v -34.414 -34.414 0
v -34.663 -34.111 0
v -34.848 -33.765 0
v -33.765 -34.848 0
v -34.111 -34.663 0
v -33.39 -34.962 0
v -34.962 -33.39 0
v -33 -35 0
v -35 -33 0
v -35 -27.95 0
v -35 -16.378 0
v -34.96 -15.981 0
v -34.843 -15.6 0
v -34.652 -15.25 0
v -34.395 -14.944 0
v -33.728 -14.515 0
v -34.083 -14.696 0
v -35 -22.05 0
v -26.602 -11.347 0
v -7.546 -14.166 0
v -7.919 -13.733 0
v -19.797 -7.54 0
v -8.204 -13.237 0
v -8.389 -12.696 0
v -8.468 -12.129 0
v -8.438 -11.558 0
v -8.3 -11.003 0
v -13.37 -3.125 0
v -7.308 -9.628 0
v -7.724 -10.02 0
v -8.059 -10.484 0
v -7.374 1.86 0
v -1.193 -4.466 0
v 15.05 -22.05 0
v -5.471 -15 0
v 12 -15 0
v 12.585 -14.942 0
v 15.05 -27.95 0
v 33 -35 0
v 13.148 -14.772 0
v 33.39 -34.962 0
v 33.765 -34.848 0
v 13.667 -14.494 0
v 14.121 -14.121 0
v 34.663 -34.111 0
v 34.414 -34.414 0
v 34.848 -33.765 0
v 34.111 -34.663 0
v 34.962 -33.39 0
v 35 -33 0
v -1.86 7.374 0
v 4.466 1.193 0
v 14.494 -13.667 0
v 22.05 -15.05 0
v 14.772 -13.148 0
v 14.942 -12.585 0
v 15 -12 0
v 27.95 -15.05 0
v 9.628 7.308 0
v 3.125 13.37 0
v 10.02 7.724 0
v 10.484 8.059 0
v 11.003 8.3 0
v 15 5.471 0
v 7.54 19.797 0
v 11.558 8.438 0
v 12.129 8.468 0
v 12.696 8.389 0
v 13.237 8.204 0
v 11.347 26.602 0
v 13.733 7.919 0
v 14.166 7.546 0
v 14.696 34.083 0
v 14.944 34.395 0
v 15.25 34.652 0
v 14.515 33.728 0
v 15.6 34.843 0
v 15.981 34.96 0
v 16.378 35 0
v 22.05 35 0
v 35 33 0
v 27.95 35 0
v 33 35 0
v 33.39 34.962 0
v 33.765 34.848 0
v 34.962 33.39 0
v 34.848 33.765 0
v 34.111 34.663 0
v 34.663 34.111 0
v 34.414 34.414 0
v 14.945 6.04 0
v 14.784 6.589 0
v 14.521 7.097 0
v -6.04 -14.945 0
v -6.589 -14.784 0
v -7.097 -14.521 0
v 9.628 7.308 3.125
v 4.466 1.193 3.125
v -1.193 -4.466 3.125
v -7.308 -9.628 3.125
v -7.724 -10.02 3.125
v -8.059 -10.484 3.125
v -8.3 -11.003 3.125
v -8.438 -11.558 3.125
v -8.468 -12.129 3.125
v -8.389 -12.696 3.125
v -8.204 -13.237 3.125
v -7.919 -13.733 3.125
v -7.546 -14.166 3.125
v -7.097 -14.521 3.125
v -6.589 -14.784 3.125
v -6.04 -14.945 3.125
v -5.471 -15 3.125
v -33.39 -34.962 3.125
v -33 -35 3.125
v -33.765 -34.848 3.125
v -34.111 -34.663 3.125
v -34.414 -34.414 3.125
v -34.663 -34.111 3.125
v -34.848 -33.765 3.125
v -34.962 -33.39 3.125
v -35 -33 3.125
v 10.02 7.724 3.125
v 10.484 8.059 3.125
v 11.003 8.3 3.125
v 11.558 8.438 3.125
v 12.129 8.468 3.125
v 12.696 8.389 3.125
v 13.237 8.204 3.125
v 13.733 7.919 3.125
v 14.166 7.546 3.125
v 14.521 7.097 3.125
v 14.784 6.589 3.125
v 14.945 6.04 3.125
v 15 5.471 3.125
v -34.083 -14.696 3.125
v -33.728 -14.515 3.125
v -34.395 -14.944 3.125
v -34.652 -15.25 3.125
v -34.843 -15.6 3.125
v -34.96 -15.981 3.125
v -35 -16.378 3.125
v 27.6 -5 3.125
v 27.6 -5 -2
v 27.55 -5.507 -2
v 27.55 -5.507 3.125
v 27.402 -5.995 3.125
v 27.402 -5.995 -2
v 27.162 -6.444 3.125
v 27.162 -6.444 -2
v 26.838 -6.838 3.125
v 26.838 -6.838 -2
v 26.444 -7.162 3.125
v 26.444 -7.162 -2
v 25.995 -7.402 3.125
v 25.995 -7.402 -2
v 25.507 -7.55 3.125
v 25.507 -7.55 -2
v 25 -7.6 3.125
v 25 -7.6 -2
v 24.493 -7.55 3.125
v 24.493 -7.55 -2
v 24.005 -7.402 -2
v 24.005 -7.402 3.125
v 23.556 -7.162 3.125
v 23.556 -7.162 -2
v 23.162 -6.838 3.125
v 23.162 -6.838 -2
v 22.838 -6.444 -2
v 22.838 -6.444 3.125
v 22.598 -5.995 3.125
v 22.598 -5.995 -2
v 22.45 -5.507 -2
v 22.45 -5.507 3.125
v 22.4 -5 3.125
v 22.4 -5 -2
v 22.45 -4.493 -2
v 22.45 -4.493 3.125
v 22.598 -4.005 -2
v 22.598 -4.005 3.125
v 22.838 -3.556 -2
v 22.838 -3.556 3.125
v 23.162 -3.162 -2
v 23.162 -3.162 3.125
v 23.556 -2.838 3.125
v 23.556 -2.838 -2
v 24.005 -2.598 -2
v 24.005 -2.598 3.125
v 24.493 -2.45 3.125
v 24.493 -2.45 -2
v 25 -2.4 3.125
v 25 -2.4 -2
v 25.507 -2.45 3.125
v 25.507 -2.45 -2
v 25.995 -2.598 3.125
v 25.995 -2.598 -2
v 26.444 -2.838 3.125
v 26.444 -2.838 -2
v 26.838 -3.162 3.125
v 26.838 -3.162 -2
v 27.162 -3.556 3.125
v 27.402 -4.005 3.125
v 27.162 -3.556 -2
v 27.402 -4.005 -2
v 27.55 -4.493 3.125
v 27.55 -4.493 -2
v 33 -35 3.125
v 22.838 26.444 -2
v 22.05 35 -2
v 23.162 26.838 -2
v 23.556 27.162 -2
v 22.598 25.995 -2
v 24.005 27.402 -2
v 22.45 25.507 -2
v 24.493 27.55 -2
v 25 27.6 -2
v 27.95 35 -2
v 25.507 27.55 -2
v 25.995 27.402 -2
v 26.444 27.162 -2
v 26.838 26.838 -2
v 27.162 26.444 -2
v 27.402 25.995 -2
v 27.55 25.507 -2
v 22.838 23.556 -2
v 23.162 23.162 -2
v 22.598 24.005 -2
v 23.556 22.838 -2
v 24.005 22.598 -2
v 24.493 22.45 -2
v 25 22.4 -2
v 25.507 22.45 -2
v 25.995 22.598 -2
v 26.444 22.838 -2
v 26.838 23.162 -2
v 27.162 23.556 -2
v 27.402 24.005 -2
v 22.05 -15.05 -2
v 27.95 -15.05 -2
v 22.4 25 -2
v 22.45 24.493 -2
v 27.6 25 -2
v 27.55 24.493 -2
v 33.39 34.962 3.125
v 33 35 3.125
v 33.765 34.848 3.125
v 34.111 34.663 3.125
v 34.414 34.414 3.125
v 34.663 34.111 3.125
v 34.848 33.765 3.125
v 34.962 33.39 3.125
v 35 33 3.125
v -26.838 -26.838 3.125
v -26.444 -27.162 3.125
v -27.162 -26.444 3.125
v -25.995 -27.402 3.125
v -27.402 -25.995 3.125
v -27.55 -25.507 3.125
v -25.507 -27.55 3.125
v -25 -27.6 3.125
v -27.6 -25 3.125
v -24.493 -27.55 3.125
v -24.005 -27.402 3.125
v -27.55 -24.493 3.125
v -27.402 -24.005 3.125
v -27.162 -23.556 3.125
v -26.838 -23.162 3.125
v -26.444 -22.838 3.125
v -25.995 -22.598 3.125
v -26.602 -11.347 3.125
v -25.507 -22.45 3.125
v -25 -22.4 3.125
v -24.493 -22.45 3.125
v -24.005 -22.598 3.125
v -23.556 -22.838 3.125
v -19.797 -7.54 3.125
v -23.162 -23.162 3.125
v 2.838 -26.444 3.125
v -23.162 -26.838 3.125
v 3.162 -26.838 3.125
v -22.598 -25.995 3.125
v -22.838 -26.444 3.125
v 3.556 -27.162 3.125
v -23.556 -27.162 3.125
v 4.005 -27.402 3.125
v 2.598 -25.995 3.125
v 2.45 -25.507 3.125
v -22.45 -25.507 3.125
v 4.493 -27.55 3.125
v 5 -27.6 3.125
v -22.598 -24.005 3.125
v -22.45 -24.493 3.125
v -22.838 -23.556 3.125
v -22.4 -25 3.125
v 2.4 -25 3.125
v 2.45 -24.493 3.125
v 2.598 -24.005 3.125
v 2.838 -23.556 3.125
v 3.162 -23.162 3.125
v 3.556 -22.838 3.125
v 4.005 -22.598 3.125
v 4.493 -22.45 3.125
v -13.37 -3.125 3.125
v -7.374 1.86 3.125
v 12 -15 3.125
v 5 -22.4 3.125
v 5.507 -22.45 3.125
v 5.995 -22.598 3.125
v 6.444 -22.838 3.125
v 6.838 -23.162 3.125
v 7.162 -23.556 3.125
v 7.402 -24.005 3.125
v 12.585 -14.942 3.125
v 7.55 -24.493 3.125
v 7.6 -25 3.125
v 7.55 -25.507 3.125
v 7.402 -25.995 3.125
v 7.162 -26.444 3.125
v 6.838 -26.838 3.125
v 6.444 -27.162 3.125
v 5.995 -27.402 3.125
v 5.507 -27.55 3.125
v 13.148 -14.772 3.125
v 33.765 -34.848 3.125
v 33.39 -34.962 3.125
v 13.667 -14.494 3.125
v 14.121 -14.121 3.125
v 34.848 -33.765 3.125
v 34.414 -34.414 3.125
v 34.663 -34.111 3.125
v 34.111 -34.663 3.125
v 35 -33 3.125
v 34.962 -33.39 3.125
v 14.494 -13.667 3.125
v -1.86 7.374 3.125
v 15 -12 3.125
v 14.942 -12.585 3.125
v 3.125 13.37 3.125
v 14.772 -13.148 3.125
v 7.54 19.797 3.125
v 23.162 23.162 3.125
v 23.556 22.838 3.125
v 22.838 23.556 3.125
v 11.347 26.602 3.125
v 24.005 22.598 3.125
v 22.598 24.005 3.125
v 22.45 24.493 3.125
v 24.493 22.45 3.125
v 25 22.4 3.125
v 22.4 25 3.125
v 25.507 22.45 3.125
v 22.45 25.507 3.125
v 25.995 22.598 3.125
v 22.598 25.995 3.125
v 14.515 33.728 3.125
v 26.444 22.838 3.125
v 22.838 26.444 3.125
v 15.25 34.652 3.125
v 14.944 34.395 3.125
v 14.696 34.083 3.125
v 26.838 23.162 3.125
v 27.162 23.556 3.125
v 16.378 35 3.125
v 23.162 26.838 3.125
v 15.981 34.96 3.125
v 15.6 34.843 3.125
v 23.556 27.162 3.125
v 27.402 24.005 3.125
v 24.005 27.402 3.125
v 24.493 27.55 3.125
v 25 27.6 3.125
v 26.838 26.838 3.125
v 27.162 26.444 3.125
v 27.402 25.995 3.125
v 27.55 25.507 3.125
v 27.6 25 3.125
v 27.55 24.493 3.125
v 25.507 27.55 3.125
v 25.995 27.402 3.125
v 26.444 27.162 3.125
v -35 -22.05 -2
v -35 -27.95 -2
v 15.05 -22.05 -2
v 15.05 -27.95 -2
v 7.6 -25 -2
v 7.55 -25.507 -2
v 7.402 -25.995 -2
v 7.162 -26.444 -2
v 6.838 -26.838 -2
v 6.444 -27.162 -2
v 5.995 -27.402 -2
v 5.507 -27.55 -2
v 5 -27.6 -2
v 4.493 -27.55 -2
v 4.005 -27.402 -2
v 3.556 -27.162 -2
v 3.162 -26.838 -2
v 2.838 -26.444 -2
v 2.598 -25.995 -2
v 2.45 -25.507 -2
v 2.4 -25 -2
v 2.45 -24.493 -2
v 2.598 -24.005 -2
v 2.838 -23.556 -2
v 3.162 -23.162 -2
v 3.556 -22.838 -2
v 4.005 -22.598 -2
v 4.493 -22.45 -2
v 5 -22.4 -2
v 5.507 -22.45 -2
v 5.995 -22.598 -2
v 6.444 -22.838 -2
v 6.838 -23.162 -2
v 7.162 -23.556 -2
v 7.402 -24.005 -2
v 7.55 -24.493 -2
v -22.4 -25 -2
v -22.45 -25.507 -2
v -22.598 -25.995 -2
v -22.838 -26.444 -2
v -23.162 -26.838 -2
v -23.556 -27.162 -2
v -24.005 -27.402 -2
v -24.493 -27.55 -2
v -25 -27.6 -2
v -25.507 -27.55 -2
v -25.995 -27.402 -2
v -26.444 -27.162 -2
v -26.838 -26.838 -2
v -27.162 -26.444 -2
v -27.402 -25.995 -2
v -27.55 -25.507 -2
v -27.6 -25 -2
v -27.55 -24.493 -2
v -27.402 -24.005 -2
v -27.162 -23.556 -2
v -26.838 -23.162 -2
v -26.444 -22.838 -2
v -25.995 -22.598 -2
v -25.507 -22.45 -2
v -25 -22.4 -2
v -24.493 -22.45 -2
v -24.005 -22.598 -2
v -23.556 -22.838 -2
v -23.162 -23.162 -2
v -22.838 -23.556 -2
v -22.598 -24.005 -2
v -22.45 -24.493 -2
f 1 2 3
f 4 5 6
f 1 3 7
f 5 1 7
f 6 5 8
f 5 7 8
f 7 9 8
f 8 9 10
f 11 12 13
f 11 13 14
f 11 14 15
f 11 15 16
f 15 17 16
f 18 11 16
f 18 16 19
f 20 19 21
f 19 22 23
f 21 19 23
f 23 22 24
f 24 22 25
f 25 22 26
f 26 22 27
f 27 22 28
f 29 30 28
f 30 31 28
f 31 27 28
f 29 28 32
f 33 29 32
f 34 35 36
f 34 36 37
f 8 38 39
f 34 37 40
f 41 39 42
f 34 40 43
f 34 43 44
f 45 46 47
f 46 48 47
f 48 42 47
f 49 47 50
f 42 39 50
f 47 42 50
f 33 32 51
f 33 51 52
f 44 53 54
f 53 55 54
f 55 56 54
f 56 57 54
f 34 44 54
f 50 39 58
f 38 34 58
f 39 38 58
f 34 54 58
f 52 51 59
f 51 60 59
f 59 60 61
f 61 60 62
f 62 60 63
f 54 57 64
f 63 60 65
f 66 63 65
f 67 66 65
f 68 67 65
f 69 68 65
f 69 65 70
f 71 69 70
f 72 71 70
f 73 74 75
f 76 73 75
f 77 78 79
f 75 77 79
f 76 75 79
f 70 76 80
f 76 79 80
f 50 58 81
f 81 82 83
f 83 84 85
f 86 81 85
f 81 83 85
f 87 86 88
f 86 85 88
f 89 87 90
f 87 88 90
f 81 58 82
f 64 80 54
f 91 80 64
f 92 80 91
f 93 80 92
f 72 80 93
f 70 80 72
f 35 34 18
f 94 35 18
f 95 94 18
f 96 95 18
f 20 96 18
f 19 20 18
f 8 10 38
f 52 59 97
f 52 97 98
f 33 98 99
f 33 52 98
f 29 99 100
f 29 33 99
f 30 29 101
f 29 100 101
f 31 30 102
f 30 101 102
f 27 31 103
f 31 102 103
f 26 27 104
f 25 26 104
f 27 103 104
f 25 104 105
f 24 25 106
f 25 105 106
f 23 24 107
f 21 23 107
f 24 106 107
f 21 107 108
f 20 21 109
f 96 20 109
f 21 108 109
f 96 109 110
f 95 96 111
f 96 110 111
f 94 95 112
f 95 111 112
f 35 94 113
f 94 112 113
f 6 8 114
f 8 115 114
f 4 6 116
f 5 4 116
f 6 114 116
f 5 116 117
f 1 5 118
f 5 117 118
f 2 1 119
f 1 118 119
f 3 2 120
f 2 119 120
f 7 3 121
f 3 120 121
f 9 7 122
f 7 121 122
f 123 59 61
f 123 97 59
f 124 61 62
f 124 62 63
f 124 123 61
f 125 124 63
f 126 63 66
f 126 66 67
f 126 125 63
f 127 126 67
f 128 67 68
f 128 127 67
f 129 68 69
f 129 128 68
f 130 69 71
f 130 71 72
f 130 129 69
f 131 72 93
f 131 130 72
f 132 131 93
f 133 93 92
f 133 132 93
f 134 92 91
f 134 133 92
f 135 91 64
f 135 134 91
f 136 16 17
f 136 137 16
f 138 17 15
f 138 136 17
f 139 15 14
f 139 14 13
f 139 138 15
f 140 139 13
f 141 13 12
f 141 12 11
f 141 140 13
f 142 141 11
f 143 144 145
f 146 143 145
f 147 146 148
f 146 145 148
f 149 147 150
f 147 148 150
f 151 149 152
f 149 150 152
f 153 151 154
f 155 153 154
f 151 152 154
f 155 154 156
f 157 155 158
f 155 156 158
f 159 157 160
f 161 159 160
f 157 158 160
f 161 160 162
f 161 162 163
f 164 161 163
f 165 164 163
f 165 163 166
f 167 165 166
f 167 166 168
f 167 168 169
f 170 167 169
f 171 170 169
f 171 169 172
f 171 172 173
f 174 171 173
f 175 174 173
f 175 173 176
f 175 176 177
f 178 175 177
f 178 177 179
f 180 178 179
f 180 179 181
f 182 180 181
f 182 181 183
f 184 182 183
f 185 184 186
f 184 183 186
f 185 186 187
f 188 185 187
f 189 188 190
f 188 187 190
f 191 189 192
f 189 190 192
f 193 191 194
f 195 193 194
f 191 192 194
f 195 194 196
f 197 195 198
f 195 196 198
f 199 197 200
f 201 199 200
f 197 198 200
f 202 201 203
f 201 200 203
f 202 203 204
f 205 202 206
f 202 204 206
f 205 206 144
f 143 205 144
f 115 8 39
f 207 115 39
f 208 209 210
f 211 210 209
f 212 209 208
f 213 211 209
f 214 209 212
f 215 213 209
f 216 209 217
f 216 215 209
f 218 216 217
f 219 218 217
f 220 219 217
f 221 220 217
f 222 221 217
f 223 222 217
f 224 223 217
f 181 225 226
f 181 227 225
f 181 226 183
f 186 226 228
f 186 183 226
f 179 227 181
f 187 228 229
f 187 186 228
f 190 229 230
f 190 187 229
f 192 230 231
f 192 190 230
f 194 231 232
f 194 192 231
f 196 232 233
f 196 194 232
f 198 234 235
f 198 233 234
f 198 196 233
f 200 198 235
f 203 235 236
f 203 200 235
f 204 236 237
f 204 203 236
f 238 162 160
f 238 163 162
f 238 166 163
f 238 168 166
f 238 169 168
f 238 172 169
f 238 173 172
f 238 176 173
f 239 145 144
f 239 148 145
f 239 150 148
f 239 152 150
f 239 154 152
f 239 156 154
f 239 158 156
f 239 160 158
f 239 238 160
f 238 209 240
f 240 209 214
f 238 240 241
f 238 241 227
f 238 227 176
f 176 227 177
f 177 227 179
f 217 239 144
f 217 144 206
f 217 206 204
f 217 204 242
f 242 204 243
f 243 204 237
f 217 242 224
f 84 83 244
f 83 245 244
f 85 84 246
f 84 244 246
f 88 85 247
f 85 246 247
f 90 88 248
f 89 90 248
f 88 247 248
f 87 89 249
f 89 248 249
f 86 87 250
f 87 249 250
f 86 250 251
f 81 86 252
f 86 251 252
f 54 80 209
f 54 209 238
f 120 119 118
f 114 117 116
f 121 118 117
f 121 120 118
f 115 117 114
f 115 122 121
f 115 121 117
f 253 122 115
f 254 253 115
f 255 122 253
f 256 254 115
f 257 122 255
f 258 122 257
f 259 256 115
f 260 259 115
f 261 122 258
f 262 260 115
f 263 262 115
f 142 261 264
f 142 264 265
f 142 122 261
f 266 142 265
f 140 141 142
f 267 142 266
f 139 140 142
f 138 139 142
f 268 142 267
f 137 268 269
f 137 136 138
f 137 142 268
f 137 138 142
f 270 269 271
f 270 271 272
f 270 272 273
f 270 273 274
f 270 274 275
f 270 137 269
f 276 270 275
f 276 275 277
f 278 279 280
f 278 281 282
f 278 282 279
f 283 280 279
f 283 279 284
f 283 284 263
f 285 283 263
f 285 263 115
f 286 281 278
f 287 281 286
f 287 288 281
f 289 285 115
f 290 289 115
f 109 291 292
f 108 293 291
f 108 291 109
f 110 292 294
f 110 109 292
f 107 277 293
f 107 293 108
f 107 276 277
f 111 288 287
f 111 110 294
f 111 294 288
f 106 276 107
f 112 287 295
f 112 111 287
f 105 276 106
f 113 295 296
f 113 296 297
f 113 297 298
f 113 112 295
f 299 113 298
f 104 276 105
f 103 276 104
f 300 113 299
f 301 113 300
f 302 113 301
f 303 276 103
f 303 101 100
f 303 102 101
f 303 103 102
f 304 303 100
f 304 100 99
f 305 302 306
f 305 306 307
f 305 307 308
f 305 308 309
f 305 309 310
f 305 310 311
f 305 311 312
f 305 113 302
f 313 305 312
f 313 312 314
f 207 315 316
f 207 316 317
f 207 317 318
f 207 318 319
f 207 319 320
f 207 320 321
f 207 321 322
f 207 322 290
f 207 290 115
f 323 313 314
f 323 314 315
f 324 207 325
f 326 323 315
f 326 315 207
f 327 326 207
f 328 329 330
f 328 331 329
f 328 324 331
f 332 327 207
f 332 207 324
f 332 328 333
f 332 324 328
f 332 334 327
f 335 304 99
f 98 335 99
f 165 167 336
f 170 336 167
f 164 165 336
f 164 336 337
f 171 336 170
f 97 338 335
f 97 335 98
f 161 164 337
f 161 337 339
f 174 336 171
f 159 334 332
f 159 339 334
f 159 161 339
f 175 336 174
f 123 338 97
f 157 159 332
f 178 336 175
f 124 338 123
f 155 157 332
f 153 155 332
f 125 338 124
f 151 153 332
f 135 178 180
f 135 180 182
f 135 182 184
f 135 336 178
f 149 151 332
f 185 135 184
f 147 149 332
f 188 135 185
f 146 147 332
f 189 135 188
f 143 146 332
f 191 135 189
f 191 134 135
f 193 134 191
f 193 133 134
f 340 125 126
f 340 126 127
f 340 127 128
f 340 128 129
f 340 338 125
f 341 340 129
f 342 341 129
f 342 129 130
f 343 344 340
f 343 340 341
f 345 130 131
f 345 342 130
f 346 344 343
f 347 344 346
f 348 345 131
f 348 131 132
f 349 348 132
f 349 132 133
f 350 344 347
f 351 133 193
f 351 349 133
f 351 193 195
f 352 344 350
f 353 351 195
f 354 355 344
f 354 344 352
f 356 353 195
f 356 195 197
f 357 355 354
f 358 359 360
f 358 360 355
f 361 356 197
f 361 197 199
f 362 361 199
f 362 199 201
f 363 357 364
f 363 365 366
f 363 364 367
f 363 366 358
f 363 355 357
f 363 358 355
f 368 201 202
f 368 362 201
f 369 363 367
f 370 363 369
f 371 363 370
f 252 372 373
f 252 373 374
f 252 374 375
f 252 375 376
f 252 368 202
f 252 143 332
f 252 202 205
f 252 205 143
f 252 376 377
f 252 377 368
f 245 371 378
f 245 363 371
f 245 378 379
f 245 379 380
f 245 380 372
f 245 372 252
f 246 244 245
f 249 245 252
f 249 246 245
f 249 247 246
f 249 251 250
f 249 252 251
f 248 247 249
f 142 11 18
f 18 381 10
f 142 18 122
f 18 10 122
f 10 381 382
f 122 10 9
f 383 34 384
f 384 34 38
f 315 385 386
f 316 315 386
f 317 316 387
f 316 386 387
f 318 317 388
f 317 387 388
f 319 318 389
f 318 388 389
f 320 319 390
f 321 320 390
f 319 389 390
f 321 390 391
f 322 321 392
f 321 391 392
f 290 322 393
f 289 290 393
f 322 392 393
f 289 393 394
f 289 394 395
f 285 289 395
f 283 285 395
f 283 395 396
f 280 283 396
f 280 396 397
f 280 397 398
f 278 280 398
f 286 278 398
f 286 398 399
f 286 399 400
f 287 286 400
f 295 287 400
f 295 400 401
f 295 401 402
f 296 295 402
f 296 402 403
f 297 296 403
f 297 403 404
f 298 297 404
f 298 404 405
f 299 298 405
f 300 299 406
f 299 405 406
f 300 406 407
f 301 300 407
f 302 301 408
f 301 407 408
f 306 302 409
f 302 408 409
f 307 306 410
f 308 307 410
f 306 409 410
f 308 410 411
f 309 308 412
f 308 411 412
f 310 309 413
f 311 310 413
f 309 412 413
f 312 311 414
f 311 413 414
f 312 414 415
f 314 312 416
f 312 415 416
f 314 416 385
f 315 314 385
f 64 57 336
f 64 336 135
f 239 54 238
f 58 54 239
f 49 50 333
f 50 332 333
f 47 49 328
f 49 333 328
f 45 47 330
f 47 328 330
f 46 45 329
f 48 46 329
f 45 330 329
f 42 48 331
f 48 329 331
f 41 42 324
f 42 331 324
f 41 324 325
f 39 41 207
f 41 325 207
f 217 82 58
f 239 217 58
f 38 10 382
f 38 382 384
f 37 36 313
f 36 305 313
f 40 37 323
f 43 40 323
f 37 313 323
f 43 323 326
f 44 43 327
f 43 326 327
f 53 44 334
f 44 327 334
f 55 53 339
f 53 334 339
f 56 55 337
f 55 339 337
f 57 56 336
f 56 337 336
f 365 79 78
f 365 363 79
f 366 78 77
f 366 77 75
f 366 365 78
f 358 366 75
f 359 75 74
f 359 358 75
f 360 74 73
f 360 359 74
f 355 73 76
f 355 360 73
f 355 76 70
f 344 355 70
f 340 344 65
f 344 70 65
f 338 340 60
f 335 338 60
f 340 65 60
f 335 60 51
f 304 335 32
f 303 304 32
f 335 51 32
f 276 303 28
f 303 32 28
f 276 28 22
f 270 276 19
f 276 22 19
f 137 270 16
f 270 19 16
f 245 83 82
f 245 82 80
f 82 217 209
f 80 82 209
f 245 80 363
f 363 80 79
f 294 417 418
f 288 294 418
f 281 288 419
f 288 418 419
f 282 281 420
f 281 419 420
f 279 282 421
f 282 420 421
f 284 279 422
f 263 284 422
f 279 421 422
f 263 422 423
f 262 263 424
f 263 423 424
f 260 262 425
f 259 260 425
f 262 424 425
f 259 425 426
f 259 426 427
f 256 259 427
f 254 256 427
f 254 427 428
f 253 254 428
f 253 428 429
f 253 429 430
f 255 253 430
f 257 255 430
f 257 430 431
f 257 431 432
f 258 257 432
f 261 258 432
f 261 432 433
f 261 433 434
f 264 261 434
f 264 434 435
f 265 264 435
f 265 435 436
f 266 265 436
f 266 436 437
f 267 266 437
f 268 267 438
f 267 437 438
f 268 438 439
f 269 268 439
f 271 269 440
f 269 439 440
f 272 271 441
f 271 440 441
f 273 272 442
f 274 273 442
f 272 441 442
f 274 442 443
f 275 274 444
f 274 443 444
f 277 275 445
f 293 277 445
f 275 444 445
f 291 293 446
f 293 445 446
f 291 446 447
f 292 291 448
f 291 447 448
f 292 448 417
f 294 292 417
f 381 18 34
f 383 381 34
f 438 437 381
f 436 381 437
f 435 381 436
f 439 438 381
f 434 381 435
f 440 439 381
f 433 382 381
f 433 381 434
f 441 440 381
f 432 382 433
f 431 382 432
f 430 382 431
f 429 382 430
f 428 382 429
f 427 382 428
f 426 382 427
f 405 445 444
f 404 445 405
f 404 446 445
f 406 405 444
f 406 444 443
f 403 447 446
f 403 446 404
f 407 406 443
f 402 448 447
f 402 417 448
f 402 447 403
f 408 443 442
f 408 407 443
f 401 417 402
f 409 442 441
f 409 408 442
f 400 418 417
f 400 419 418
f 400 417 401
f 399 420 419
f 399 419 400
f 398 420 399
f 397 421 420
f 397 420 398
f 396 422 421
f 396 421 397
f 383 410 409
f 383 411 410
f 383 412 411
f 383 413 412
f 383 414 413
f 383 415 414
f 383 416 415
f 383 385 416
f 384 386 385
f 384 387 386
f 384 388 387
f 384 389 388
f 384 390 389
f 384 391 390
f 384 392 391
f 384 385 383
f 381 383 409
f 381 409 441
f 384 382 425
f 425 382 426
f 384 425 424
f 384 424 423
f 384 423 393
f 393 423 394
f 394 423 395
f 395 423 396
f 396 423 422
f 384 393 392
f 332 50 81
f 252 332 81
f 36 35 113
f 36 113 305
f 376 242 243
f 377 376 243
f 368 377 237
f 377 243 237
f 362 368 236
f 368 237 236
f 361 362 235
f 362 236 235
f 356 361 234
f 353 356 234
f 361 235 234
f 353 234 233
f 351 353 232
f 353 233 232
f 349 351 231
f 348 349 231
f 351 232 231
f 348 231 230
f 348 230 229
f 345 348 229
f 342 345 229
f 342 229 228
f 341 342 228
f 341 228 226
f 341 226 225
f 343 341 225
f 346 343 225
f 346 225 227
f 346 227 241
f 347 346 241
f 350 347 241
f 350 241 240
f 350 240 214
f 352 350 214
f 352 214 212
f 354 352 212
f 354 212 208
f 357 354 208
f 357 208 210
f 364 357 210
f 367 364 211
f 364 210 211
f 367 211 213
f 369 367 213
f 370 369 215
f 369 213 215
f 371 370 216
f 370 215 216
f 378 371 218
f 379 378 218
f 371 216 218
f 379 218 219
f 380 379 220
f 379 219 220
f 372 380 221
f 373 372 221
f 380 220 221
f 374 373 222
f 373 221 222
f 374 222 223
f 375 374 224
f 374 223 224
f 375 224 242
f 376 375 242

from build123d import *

# Parameters (mm, degrees)
F1_DEPTH = 3.125
F2_W     = 5.9
F2_H     = 50.05
F2_W_2   = 50.05
F2_H_2   = 5.9
F3_DEPTH = 2
F4_R     = 2.6
F5_DEPTH = 25
F6_R     = 2
F8_DEPTH = 25
F9_R     = 3


# Not quite as in the source:
# - a feature names something its author has since deleted; it is built from what else it names


with BuildPart() as f1:
    # F0 (on Top) → F1 (new body)
    with BuildSketch(Plane.XY):
        with BuildLine():
            Line((35, 35), (15, 35))
            ThreePointArc((15, 35), (-4.5539513718, 4.5539513718), (-35, -15))
            Line((-35, -15), (-35, -35))
            Line((-35, -35), (35, -35))
            Line((35, -35), (35, 35))
        make_face()
    extrude(amount=F1_DEPTH)

    # F2 (on face) → F3 (join)
    with BuildSketch(Plane(origin=(0, 0, 0), x_dir=(1, 0, 0), z_dir=(0, 0, -1))):
        with Locations((25, -9.975)):
            Rectangle(F2_W, F2_H)
        with Locations((-9.975, 25)):
            Rectangle(F2_W_2, F2_H_2)
    extrude(amount=F3_DEPTH)

    # F4 (on face) → F5 (cut)
    with BuildSketch(Plane(origin=(0, 0, -2), x_dir=(1, 0, 0), z_dir=(0, 0, -1))):
        with Locations((25, -25)):
            Circle(F4_R)
        with Locations((25, 5)):
            Circle(F4_R)
        with Locations((5, 25)):
            Circle(F4_R)
        with Locations((-25, 25)):
            Circle(F4_R)
    extrude(amount=-F5_DEPTH, mode=Mode.SUBTRACT)

    # F6
    f6_edges = [f1.edges().sort_by_distance(p)[0] for p in [
        (35, 35, 1.5625),
        (15, 35, 1.5625),
        (-35, -15, 1.5625),
        (-35, -35, 1.5625),
        (35, -35, 1.5625),
    ]]
    fillet(f6_edges, radius=F6_R)

    # F7 (on Top) → F8 (cut)
    with BuildSketch(Plane.XY):
        with BuildLine():
            Line((15, -15), (15, 15))
            ThreePointArc((15, 15), (1.6961399442, -1.6961399442), (-15, -15))
            Line((-15, -15), (15, -15))
        make_face()
    extrude(amount=F8_DEPTH, mode=Mode.SUBTRACT)

    # F9
    f9_edges = [f1.edges().sort_by_distance(p)[0] for p in [
        (15, 15, 1.5625),
        (15, -15, 1.5625),
        (-15, -15, 1.5625),
    ]]
    fillet(f9_edges, radius=F9_R)


solid = f1.part
